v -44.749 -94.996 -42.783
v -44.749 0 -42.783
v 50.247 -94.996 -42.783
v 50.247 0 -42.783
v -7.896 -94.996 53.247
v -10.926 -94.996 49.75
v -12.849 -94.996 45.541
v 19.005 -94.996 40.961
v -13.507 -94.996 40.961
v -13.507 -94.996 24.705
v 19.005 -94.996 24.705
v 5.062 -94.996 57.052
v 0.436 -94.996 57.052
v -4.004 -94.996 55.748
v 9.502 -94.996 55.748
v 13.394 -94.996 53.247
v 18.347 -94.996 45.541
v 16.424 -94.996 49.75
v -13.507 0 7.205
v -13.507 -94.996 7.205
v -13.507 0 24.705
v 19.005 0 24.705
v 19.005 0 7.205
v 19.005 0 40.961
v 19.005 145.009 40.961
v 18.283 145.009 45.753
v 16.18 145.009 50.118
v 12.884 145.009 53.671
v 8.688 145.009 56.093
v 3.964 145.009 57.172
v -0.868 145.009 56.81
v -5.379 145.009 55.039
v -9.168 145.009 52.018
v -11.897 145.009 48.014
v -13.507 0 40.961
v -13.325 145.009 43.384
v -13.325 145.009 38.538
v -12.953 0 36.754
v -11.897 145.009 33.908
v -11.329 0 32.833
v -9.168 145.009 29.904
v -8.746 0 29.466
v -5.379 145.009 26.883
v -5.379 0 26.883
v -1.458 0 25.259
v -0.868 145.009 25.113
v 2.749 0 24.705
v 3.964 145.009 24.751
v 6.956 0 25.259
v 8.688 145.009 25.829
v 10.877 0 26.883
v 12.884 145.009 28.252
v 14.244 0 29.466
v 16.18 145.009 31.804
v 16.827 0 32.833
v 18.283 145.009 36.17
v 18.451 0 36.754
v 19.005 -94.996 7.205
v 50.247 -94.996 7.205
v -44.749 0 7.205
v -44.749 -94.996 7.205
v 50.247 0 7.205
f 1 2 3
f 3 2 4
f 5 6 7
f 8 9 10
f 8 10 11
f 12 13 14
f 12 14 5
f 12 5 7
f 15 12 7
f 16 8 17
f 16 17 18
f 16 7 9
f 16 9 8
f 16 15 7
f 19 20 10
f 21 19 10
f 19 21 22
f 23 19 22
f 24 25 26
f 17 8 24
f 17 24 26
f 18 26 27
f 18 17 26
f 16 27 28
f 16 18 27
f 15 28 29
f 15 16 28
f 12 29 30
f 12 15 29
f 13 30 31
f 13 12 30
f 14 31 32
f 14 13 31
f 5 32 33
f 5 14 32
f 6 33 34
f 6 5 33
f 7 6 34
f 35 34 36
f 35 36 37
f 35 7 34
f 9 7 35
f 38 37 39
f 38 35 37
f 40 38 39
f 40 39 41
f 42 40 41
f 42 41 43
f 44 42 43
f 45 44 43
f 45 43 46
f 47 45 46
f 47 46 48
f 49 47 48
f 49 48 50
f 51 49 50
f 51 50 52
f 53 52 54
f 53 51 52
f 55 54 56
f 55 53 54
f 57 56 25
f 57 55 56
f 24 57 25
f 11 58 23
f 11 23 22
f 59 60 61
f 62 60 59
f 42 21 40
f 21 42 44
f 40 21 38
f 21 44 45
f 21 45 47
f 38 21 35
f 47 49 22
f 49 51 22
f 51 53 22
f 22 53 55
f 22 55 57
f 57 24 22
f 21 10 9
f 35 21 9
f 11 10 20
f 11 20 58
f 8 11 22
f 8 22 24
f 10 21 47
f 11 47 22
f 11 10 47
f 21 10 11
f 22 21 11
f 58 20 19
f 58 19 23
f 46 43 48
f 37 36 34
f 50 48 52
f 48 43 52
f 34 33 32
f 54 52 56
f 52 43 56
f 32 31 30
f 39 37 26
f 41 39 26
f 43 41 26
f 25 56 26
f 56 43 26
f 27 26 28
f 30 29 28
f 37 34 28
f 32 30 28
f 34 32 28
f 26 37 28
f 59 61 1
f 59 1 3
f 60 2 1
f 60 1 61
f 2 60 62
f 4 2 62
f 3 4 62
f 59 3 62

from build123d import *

# Parameters (mm, degrees)
F0_W     = 94.996
F0_H     = 49.9872
F1_DEPTH = 94.996
F2_W     = 32.512
F2_H     = 17.5006
F3_DEPTH = 94.996
F4_R     = 16.256
F5_DEPTH = 240.0046
F6_W     = 32.512
F6_H     = 16.256
F7_DEPTH = 94.996


with BuildPart() as f1:
    # F0 (on Front) → F1 (new body)
    with BuildSketch(Plane.XZ):
        with Locations((2.7489867061, -17.7890766389)):
            Rectangle(F0_W, F0_H)
    extrude(amount=F1_DEPTH)


with BuildPart() as f3:
    # F2 (on face) → F3 (new body)
    with BuildSketch(Plane.XZ.offset(94.996)):
        with Locations((2.7489867061, 15.9548233611)):
            Rectangle(F2_W, F2_H)
    extrude(amount=-F3_DEPTH)


with BuildPart() as f5:
    # F4 (on face) → F5 (new body)
    with BuildSketch(Plane.XZ.offset(94.996)):
        with Locations((2.7489867061, 40.9611233611)):
            Circle(F4_R)
    extrude(amount=-F5_DEPTH)

    # F6 (on face) → F7 (join)
    with BuildSketch(Plane.XZ.offset(94.996)):
        with Locations((2.7489867061, 32.8331233611)):
            Rectangle(F6_W, F6_H)
    extrude(amount=-F7_DEPTH)


solid = Compound([f1.part, f3.part, f5.part])
